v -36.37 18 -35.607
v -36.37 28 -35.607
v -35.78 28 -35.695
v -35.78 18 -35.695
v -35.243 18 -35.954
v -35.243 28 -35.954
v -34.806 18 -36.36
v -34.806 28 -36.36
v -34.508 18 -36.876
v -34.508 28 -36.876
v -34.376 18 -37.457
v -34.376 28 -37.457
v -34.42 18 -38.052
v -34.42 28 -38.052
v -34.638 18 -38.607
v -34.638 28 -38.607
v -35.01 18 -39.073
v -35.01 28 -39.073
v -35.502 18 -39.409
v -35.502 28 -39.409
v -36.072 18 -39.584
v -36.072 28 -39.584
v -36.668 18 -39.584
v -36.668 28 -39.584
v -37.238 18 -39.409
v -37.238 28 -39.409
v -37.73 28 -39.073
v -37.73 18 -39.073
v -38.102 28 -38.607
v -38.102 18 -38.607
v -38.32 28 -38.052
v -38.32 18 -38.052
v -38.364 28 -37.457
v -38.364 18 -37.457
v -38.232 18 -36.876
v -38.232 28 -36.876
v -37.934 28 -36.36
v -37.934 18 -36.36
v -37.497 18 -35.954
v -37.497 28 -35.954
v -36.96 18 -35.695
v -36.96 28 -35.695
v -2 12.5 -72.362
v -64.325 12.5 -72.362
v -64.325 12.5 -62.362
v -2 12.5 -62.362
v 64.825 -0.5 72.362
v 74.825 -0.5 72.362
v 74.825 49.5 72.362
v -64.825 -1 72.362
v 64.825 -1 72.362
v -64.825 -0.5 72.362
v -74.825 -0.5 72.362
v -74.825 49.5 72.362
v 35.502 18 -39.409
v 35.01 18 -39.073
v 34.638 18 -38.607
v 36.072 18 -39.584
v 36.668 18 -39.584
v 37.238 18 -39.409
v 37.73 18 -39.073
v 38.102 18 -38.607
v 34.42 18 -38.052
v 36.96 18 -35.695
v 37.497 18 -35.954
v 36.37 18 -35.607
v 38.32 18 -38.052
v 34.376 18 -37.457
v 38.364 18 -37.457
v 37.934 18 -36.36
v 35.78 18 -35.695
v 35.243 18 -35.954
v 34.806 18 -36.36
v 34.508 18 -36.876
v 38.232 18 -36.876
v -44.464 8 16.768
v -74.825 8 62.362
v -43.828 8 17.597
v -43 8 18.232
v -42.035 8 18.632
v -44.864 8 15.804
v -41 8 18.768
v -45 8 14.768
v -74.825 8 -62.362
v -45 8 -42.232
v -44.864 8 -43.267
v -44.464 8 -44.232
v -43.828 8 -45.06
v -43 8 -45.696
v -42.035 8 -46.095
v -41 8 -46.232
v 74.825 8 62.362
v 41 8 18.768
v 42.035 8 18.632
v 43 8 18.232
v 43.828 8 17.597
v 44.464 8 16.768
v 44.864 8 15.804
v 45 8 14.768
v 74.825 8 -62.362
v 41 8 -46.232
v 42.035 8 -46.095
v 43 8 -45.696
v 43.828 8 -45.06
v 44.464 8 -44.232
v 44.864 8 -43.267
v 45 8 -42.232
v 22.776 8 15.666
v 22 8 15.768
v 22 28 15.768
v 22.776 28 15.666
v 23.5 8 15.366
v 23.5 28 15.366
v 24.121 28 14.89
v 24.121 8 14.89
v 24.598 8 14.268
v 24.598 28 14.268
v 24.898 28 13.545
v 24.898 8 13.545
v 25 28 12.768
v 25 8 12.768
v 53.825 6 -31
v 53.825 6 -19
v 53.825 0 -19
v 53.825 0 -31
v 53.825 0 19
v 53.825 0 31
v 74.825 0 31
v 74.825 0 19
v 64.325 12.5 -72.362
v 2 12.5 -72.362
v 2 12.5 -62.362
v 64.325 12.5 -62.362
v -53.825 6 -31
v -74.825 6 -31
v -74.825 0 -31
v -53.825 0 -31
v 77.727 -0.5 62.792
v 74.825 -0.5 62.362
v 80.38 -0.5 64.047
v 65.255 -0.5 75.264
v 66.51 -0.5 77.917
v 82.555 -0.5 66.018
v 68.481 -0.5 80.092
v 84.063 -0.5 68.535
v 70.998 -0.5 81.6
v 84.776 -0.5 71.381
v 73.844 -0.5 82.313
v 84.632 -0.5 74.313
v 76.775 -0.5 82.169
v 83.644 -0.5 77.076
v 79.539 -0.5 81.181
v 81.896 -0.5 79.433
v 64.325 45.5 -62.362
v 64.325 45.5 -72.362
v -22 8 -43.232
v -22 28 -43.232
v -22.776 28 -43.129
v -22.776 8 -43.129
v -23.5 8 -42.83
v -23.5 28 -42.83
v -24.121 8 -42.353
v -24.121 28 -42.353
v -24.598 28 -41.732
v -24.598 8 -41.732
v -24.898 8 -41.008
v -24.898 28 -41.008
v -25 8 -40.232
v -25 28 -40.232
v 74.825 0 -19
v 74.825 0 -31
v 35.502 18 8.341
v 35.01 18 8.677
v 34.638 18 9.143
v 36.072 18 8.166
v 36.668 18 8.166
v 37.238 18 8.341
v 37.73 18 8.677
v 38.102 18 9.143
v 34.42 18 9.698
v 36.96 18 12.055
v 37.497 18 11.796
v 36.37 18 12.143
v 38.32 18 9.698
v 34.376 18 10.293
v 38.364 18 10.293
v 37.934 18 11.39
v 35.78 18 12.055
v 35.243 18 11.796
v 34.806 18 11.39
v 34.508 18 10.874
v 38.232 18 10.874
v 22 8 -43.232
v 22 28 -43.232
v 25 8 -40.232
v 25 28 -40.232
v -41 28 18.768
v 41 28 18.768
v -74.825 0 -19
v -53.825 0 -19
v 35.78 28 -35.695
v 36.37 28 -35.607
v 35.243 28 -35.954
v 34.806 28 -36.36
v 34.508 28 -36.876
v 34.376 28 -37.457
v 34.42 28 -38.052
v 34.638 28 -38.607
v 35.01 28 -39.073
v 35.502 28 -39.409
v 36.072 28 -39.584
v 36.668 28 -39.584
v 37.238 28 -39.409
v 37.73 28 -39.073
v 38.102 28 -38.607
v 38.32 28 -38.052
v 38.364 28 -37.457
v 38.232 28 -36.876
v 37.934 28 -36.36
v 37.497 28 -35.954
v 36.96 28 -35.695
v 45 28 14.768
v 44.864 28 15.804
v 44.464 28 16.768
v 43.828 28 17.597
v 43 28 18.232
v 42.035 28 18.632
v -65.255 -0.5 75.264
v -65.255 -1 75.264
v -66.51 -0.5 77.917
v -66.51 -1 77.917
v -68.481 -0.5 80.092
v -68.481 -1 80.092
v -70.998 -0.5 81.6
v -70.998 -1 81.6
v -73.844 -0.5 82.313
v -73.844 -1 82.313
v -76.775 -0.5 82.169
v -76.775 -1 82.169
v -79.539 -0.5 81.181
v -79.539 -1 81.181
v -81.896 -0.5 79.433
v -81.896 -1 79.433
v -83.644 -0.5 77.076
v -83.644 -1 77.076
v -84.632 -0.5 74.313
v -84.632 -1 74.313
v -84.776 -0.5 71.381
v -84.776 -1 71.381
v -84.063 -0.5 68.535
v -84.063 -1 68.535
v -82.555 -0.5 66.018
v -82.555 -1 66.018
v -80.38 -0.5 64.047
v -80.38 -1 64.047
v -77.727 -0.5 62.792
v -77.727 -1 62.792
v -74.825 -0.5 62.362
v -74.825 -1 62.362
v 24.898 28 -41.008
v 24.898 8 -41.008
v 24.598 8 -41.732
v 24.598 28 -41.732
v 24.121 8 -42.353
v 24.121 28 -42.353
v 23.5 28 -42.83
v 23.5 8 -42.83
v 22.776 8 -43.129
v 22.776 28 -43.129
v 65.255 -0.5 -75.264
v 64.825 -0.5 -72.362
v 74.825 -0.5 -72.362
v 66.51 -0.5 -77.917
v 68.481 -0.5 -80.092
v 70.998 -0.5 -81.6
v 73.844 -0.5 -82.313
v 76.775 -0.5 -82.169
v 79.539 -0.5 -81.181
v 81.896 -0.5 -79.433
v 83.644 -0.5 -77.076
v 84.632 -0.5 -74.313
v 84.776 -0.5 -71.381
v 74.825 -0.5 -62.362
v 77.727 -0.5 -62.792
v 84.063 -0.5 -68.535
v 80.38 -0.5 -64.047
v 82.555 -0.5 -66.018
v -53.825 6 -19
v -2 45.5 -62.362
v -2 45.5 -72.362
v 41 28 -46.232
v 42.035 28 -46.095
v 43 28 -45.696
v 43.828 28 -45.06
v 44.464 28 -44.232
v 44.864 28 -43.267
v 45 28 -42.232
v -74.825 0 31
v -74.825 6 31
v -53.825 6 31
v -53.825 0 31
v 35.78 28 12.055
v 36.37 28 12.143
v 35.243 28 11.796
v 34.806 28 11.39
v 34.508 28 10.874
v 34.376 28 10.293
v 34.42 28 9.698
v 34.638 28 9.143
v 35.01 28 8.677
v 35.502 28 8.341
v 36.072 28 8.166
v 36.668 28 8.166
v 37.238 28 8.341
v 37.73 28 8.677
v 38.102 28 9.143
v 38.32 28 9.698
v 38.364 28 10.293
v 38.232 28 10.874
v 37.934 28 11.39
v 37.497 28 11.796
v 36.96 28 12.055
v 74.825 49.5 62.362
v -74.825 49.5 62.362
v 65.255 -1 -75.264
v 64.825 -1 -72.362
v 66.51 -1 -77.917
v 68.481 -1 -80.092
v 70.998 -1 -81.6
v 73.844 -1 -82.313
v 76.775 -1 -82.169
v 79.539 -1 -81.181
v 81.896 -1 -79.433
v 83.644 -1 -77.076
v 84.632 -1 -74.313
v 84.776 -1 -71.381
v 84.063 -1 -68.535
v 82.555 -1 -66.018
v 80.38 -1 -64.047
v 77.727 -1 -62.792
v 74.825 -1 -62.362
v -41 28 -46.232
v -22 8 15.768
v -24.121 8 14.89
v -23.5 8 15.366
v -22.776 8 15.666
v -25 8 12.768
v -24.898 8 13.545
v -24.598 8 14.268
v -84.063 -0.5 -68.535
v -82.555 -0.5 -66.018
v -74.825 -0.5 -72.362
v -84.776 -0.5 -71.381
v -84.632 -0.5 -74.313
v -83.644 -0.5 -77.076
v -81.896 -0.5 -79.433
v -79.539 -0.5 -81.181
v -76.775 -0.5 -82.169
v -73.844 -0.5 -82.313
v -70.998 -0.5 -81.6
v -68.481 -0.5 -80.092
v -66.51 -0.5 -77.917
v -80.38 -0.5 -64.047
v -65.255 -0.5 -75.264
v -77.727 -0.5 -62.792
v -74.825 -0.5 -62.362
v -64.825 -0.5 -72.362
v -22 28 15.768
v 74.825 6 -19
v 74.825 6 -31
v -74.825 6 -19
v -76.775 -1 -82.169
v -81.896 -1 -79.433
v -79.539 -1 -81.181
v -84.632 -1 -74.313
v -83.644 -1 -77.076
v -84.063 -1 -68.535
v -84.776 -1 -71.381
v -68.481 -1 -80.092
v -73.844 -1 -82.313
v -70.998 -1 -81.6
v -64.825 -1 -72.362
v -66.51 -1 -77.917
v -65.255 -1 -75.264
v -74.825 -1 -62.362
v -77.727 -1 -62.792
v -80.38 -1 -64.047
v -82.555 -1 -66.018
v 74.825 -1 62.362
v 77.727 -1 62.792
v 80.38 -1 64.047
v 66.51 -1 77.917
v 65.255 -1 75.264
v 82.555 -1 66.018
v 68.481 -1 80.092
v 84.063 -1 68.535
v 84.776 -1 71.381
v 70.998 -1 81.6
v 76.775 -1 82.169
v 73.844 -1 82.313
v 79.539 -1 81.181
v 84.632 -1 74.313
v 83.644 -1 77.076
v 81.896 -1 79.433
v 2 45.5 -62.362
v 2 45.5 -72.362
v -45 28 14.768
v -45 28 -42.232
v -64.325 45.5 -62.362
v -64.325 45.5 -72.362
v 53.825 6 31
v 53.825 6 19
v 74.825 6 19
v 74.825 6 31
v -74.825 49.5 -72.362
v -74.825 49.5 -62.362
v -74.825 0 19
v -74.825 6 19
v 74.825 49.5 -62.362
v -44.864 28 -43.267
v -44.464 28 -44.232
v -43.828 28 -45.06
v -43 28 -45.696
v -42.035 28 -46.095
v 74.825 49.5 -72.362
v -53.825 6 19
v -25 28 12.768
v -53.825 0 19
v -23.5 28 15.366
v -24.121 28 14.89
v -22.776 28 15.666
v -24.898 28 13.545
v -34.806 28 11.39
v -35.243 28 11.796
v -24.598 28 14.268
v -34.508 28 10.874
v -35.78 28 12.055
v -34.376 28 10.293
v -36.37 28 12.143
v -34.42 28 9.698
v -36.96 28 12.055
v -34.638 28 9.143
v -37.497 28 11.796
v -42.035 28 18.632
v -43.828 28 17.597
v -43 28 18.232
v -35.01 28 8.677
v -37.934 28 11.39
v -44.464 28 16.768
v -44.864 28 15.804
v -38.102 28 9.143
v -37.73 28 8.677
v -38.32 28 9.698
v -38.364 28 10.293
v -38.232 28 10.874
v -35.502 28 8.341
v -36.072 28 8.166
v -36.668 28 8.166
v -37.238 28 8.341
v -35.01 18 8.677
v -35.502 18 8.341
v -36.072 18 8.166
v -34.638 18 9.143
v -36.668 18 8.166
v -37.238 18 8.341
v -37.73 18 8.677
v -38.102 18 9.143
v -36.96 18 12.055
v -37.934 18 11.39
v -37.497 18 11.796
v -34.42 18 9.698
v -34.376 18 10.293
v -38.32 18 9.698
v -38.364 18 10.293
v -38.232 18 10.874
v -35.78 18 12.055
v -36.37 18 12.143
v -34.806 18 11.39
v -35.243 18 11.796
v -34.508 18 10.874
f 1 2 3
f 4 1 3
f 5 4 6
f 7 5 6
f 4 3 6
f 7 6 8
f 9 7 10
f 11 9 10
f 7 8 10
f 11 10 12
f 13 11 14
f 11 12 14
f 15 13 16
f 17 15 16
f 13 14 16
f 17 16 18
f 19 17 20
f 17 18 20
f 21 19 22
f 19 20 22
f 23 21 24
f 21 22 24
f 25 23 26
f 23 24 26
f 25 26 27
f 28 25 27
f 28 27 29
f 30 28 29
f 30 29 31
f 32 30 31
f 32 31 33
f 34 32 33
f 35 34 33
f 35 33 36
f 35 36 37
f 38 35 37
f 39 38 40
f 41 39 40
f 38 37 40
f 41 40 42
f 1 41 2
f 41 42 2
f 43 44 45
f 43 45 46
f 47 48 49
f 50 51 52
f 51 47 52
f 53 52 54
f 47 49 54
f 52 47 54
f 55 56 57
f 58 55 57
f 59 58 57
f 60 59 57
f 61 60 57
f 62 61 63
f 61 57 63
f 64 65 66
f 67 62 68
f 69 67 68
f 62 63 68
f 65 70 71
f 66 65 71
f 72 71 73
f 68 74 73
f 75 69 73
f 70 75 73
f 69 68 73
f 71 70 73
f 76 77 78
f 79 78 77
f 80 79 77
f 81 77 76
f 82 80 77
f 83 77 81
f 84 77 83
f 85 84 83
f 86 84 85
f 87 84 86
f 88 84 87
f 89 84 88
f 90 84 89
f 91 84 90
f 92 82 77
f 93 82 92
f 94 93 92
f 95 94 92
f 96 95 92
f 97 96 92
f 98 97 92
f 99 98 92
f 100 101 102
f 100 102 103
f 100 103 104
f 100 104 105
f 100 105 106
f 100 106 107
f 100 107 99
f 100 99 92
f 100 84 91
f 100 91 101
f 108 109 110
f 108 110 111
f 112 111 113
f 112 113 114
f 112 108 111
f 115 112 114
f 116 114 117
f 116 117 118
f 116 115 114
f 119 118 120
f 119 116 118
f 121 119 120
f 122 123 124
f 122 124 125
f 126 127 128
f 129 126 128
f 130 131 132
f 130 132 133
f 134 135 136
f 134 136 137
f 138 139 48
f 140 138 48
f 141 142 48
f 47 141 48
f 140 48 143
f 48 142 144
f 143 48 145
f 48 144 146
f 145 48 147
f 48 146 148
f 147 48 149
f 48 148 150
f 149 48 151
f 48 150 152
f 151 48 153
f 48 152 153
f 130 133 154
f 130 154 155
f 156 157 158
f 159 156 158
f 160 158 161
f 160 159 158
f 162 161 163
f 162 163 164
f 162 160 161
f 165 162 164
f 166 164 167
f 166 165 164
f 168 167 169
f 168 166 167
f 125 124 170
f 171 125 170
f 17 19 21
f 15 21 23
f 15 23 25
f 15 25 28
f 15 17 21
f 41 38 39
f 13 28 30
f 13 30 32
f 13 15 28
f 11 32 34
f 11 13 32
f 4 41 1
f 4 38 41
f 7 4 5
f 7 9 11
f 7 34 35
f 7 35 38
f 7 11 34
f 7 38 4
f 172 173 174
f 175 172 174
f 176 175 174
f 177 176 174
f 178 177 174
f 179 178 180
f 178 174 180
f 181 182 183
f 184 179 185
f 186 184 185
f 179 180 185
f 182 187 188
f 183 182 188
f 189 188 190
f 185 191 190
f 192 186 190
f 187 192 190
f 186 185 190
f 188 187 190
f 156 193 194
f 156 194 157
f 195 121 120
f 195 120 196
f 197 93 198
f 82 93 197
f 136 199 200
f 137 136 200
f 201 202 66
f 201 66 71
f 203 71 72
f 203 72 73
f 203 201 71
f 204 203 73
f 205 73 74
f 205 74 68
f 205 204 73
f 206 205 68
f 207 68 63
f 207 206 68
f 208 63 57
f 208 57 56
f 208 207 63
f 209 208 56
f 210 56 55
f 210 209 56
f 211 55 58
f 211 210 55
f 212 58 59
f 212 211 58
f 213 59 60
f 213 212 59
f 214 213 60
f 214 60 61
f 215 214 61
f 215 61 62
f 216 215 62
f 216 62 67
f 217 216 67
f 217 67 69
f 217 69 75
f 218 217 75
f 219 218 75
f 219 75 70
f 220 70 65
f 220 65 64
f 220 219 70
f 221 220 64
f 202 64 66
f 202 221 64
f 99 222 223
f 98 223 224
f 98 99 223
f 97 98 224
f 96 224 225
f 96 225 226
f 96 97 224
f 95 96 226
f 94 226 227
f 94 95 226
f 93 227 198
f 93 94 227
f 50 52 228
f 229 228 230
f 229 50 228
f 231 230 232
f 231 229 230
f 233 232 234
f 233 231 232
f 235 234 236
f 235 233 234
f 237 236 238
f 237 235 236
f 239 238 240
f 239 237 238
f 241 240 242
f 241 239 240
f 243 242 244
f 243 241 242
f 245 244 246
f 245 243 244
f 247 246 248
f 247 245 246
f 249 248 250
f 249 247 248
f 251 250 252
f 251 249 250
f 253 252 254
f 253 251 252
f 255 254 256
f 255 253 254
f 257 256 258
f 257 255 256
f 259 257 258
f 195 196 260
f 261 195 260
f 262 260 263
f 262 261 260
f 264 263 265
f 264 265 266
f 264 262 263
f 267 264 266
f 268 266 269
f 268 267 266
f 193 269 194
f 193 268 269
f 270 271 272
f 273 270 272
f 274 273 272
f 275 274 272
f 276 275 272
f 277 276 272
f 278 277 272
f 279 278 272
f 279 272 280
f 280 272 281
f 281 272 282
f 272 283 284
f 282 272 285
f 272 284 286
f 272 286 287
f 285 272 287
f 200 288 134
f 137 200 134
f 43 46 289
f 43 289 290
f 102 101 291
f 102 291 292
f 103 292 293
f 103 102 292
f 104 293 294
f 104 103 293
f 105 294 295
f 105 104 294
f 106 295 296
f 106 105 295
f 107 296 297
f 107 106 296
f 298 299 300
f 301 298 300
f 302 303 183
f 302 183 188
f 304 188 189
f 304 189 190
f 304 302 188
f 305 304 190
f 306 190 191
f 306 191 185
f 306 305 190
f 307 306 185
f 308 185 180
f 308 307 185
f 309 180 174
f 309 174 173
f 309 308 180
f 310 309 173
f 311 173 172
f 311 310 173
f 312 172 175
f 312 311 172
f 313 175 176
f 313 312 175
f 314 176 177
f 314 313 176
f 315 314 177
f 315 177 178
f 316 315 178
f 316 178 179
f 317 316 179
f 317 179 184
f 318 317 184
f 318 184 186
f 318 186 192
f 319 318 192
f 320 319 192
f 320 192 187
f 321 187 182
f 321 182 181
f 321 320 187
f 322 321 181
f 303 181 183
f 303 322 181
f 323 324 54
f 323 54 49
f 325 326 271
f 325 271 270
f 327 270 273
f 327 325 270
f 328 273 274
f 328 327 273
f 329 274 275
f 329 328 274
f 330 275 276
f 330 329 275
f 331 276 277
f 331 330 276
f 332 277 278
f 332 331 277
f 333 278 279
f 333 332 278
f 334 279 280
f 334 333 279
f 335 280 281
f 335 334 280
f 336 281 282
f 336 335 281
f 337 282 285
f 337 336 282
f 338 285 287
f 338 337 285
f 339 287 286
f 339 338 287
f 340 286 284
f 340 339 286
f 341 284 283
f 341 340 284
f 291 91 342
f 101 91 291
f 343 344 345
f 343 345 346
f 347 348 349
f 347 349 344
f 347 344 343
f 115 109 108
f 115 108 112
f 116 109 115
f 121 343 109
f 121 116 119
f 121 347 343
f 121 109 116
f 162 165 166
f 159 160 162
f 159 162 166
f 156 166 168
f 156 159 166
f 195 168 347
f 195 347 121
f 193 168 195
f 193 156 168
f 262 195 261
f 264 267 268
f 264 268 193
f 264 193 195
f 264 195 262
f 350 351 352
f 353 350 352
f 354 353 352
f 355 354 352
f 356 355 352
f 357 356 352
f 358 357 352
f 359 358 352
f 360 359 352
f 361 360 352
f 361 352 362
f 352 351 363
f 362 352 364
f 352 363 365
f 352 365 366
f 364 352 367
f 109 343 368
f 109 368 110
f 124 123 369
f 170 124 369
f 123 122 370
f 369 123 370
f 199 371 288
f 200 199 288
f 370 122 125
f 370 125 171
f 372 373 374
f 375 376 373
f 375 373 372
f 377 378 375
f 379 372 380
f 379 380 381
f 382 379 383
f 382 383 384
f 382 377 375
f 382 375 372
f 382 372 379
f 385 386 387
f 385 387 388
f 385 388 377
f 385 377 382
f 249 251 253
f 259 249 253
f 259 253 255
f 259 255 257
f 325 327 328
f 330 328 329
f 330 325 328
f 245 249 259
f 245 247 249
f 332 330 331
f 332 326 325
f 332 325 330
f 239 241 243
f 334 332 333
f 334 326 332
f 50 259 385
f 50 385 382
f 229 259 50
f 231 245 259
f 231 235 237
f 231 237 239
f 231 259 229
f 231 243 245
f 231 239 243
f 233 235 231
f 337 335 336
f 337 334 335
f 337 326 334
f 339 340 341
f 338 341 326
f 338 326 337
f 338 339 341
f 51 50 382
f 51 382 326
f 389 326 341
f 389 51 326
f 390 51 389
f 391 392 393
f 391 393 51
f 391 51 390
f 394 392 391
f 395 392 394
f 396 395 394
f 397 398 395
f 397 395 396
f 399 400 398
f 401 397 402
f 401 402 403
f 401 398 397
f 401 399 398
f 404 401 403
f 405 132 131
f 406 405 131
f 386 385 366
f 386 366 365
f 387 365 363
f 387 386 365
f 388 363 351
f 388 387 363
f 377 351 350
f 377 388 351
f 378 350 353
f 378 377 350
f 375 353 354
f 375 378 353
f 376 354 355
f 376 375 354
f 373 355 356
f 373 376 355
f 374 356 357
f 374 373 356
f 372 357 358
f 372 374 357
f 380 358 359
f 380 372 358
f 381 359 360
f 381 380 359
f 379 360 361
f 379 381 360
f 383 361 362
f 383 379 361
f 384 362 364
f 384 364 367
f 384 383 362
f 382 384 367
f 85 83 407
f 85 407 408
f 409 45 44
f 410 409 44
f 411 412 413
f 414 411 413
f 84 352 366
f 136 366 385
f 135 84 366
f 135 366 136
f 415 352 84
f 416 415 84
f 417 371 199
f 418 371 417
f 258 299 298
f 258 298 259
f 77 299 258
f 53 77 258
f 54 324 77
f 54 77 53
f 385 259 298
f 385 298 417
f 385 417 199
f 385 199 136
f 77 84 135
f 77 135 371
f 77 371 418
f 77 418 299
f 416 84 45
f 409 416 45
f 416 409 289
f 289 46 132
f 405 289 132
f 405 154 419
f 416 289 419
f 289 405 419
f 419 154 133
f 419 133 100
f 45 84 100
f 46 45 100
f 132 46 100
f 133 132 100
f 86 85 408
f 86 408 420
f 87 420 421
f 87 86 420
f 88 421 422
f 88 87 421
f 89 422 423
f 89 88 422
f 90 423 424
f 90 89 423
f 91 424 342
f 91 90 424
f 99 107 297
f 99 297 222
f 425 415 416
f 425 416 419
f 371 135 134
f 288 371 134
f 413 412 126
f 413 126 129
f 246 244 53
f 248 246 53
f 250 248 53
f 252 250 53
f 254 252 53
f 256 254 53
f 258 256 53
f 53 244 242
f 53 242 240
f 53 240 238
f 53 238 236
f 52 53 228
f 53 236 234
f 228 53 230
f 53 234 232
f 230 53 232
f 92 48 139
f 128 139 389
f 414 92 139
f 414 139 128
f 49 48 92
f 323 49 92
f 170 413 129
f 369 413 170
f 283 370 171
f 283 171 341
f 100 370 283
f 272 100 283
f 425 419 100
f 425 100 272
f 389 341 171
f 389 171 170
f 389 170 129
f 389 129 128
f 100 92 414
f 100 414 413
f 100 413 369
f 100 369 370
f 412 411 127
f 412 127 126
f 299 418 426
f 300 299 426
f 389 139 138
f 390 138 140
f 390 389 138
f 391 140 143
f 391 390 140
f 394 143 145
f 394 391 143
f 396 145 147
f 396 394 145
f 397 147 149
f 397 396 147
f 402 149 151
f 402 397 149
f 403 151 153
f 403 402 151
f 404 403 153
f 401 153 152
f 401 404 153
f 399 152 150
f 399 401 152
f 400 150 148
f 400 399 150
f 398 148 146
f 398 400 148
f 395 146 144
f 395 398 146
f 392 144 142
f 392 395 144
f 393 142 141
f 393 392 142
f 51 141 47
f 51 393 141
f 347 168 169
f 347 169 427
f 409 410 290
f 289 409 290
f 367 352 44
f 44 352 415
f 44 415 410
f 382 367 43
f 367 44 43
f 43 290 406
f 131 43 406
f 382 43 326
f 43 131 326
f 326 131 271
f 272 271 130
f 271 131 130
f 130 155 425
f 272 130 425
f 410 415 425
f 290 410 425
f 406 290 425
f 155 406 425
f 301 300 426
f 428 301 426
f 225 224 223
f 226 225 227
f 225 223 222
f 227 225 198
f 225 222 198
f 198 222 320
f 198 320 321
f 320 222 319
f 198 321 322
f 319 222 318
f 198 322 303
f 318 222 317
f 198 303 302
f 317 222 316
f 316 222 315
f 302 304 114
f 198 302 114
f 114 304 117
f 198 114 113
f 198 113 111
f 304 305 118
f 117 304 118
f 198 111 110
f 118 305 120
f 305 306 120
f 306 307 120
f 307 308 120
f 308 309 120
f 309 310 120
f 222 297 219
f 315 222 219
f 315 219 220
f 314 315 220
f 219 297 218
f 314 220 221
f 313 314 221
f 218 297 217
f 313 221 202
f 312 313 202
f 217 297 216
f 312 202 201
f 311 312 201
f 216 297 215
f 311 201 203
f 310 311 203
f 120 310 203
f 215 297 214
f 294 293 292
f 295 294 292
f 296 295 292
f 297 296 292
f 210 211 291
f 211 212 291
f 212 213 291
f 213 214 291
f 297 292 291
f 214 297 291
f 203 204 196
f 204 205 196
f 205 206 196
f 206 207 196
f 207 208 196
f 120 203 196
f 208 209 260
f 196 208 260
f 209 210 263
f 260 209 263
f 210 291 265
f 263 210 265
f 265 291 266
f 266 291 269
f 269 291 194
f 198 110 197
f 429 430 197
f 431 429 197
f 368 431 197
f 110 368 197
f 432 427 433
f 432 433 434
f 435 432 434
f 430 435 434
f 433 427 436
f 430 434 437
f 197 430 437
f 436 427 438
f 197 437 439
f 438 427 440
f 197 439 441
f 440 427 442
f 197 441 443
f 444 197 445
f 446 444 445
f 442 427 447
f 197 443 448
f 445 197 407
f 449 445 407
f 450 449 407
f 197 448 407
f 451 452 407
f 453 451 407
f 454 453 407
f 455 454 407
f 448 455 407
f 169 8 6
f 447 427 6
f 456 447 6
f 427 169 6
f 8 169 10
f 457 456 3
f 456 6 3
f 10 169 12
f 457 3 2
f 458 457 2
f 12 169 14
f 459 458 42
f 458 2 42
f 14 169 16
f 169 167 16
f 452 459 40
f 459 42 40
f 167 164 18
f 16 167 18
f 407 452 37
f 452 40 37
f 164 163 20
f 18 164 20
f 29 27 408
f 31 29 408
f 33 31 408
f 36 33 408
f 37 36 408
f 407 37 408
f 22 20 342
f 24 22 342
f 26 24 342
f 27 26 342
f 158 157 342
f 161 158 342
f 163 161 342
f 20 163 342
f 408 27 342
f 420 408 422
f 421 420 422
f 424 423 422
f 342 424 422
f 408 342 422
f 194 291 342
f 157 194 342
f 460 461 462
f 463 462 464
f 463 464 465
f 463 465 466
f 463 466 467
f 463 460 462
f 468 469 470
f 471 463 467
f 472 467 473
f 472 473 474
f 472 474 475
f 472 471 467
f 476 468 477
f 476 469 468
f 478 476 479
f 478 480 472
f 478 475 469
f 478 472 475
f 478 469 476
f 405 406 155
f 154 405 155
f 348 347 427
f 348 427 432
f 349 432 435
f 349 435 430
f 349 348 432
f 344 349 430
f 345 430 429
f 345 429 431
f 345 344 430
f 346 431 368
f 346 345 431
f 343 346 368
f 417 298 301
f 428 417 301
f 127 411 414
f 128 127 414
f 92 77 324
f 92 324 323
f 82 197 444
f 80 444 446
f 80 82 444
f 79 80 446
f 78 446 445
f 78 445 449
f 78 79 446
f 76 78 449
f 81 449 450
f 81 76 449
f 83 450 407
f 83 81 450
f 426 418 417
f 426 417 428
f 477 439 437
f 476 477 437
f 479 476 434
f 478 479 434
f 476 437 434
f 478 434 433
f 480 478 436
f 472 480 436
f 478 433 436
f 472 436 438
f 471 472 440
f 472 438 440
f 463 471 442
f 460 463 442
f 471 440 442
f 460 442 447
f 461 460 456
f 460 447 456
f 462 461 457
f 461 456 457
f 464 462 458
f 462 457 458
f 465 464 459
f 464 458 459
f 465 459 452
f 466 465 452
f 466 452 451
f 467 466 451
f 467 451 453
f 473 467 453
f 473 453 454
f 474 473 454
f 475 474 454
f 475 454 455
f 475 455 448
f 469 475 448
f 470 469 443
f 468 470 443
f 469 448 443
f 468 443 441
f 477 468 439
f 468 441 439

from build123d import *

# Parameters (mm, degrees)
BOSS_EXTRUDE1_DEPTH     = 8
SKETCH2_W               = 10.5
SKETCH2_H               = 10
BOSS_EXTRUDE2_DEPTH     = 37.5
SKETCH4_W               = 128.649180674
SKETCH4_H               = 10
BOSS_EXTRUDE4_DEPTH     = 4.5
BOSS_EXTRUDE5_DEPTH     = 10
SKETCH6_W               = 149.649180674
SKETCH6_H               = 10
BOSS_EXTRUDE6_DEPTH     = 4
CUT_EXTRUDE1_REACH      = 249.54
SKETCH7_R               = 2.5
MIRROR2_COPY_1_REACH    = 249.54
MIRROR2_COPY_1_SKETCH_R = 2.5
CUT_EXTRUDE2_REACH      = 314.548
SKETCH8_R               = 2.5
BOSS_EXTRUDE8_DEPTH     = 63
CUT_EXTRUDE3_REACH      = 257.708
SKETCH10_R              = 2.5
MIRROR5_COPY_1_REACH    = 257.708
MIRROR5_COPY_1_SKETCH_R = 2.5
CUT_EXTRUDE4_REACH      = 321.057
SKETCH11_R              = 2.5
SKETCH12_W              = 6.577848346
SKETCH12_H              = 46
BOSS_EXTRUDE9_DEPTH     = 12
BOSS_EXTRUDE10_DEPTH    = 20
SKETCH14_R              = 2
CUT_EXTRUDE5_DEPTH      = 10
SKETCH15_W              = 149.649180674
SKETCH15_H              = 10
BOSS_EXTRUDE11_DEPTH    = 41.5
SKETCH17_R              = 2
CUT_EXTRUDE6_DEPTH      = 10
ENL_V_START             = -2
ESQUISSE1_W             = 12
ESQUISSE1_H             = 42
ESQUISSE1_W_2           = 42
ESQUISSE1_H_2           = 12
ENL_V_MAT_EXTRU_1_DEPTH = 6
BOSS_EXTRU_1_DEPTH      = 1
CONG_1_R                = 5
ENL_V_MAT_EXTRU_2_DEPTH = 10
ESQUISSE5_W             = 52
ESQUISSE5_H             = 55
ENL_V_MAT_EXTRU_3_DEPTH = 10
ESQUISSE6_W             = 52
ESQUISSE6_H             = 55
ENL_V_MAT_EXTRU_4_DEPTH = 10
ESQUISSE7_W             = 52
ESQUISSE7_H             = 55
ENL_V_MAT_EXTRU_5_DEPTH = 10
ESQUISSE8_W             = 52
ESQUISSE8_H             = 55
ENL_V_MAT_EXTRU_6_DEPTH = 10
ESQUISSE9_W             = 52
ESQUISSE9_H             = 55
ENL_V_MAT_EXTRU_7_DEPTH = 10
BOSS_EXTRU_2_REACH      = 182.079
ESQUISSE11_W            = 4
ESQUISSE11_H            = 10
ENL_V_MAT_EXTRU_8_DEPTH = 186.634594874
ESQUISSE13_R            = 10
BOSS_EXTRU_3_DEPTH      = 0.5


with BuildPart() as part:
    # Sketch1 → Boss-Extrude1 (new body)
    with BuildSketch(Plane(origin=(0, 0, 0), x_dir=(1, 0, 0), z_dir=(0, 1, 0))):
        Polygon((-150, 45), (-150, -45), (-74.824590337, -72.361611466), (74.824590337, -72.361611466), (150, -45), (150, 45), (74.824590337, 72.361611466), (-74.824590337, 72.361611466), align=None)
    extrude(amount=BOSS_EXTRUDE1_DEPTH)

    # Sketch2 → Boss-Extrude2 (add)
    with BuildSketch(Plane(origin=(0, 8, 0), x_dir=(1, 0, 0), z_dir=(0, 1, 0))):
        with Locations((69.574590337, 67.361611466)):
            Rectangle(SKETCH2_W, SKETCH2_H)
        with Locations((-69.574590337, 67.361611466)):
            Rectangle(SKETCH2_W, SKETCH2_H)
    extrude(amount=BOSS_EXTRUDE2_DEPTH)

    # Sketch4 → Boss-Extrude4 (add)
    with BuildSketch(Plane(origin=(0, 8, 0), x_dir=(1, 0, 0), z_dir=(0, 1, 0))):
        with Locations((0, 67.361611466)):
            Rectangle(SKETCH4_W, SKETCH4_H)
    extrude(amount=BOSS_EXTRUDE4_DEPTH)

    # Sketch5 → Boss-Extrude5 (add)
    with BuildSketch(Plane(origin=(0, 8, 0), x_dir=(1, 0, 0), z_dir=(0, 1, 0))):
        Polygon((-74.824590337, 62.361611466), (-87.040594407, 57.915349603), (-140.603073792, 38.420201433), (-143.422151654, 37.394141003), (-143.422151654, -37.394141003), (-140.603073792, -38.420201433), (-87.040594407, -57.915349603), (-74.824590337, -62.361611466), (-74.824590337, -72.361611466), (-150, -45), (-150, 45), (-74.824590337, 72.361611466), align=None)
        Polygon((150, 45), (150, -45), (74.824590337, -72.361611466), (74.824590337, -62.361611466), (87.040594407, -57.915349603), (140.603073792, -38.420201433), (143.422151654, -37.394141003), (143.422151654, 37.394141003), (140.603073792, 38.420201433), (87.040594407, 57.915349603), (74.824590337, 62.361611466), (74.824590337, 72.361611466), align=None)
    extrude(amount=BOSS_EXTRUDE5_DEPTH)

    # Sketch6 → Boss-Extrude6 (add)
    with BuildSketch(Plane(origin=(0, 45.5, 0), x_dir=(1, 0, 0), z_dir=(0, 1, 0))):
        with Locations((0, 67.361611466)):
            Rectangle(SKETCH6_W, SKETCH6_H)
    extrude(amount=BOSS_EXTRUDE6_DEPTH)

    # Sketch7 → Cut-Extrude1 (cut, up to next)
    with BuildSketch(Plane(origin=(32.009387984, 0, -87.945070697), x_dir=(-0.9396926207859068, 0, -0.3420201433256732), z_dir=(0.3420201433256732, 0, -0.9396926207859068)), mode=Mode.PRIVATE) as cut_extrude1_sk1:
        with Locations((-113.852986668, 13)):
            Circle(SKETCH7_R)
    cut_extrude1_tool1 = extrude(cut_extrude1_sk1.sketch, amount=-CUT_EXTRUDE1_REACH, mode=Mode.PRIVATE) & part.part
    # Sketch7 → Cut-Extrude1 (cut, up to next)
    with BuildSketch(Plane(origin=(32.009387984, 0, -87.945070697), x_dir=(-0.9396926207859068, 0, -0.3420201433256732), z_dir=(0.3420201433256732, 0, -0.9396926207859068)), mode=Mode.PRIVATE) as cut_extrude1_sk2:
        with Locations((-57.272986668, 13)):
            Circle(SKETCH7_R)
    cut_extrude1_tool2 = extrude(cut_extrude1_sk2.sketch, amount=-CUT_EXTRUDE1_REACH, mode=Mode.PRIVATE) & part.part
    cut_extrude1_1 = cut_extrude1_tool1.solids().sort_by_distance((138.996199, 13, -49.005056))[0]
    add(cut_extrude1_1, mode=Mode.SUBTRACT)
    cut_extrude1_2 = cut_extrude1_tool2.solids().sort_by_distance((85.828391, 13, -68.356556))[0]
    add(cut_extrude1_2, mode=Mode.SUBTRACT)
    cut_extrude1 = cut_extrude1_1 + cut_extrude1_2  # Cut-Extrude1 as one shape, for the pattern or mirror that repeats it

    # Mirror1: Cut-Extrude1 across plane
    add(cut_extrude1.mirror(Plane(origin=(0, 0, 0), x_dir=(0, 0, 1), z_dir=(1, 0, 0))), mode=Mode.SUBTRACT)

    # Mirror2: Cut-Extrude1 across plane
    add(cut_extrude1.mirror(Plane(origin=(0, 0, 0), x_dir=(1, 0, 0), z_dir=(0, 0, -1))), mode=Mode.SUBTRACT)

    # Mirror2 copy 1 sketch → Mirror2 copy 1 (cut, up to next)
    with BuildSketch(Plane(origin=(-32.009387984, 0, 87.945070697), x_dir=(0.9396926207859068, 0, 0.3420201433256732), z_dir=(-0.3420201433256732, 0, 0.9396926207859068)), mode=Mode.PRIVATE) as mirror2_copy_1_sk1:
        with Locations((-113.852986668, 13)):
            Circle(MIRROR2_COPY_1_SKETCH_R)
    mirror2_copy_1_tool1 = extrude(mirror2_copy_1_sk1.sketch, amount=-MIRROR2_COPY_1_REACH, mode=Mode.PRIVATE) & part.part
    # Mirror2 copy 1 sketch → Mirror2 copy 1 (cut, up to next)
    with BuildSketch(Plane(origin=(-32.009387984, 0, 87.945070697), x_dir=(0.9396926207859068, 0, 0.3420201433256732), z_dir=(-0.3420201433256732, 0, 0.9396926207859068)), mode=Mode.PRIVATE) as mirror2_copy_1_sk2:
        with Locations((-57.272986668, 13)):
            Circle(MIRROR2_COPY_1_SKETCH_R)
    mirror2_copy_1_tool2 = extrude(mirror2_copy_1_sk2.sketch, amount=-MIRROR2_COPY_1_REACH, mode=Mode.PRIVATE) & part.part
    add(mirror2_copy_1_tool1.solids().sort_by_distance((-138.996199, 13, 49.005056))[0], mode=Mode.SUBTRACT)
    add(mirror2_copy_1_tool2.solids().sort_by_distance((-85.828391, 13, 68.356556))[0], mode=Mode.SUBTRACT)

    # Sketch8 → Cut-Extrude2 (cut, up to next)
    with BuildSketch(Plane(origin=(150, 0, 0), x_dir=(0, 0, -1), z_dir=(1, 0, 0)), mode=Mode.PRIVATE) as cut_extrude2_sk1:
        with Locations((-28.29, 13)):
            Circle(SKETCH8_R)
    cut_extrude2_tool1 = extrude(cut_extrude2_sk1.sketch, amount=-CUT_EXTRUDE2_REACH, mode=Mode.PRIVATE) & part.part
    # Sketch8 → Cut-Extrude2 (cut, up to next)
    with BuildSketch(Plane(origin=(150, 0, 0), x_dir=(0, 0, -1), z_dir=(1, 0, 0)), mode=Mode.PRIVATE) as cut_extrude2_sk2:
        with Locations((28.29, 13)):
            Circle(SKETCH8_R)
    cut_extrude2_tool2 = extrude(cut_extrude2_sk2.sketch, amount=-CUT_EXTRUDE2_REACH, mode=Mode.PRIVATE) & part.part
    cut_extrude2_1 = cut_extrude2_tool1.solids().sort_by_distance((150, 13, 28.29))[0]
    add(cut_extrude2_1, mode=Mode.SUBTRACT)
    cut_extrude2_2 = cut_extrude2_tool2.solids().sort_by_distance((150, 13, -28.29))[0]
    add(cut_extrude2_2, mode=Mode.SUBTRACT)
    cut_extrude2 = cut_extrude2_1 + cut_extrude2_2  # Cut-Extrude2 as one shape, for the pattern or mirror that repeats it

    # Mirror3: Cut-Extrude2 across plane
    add(cut_extrude2.mirror(Plane(origin=(0, 0, 0), x_dir=(0, 0, 1), z_dir=(1, 0, 0))), mode=Mode.SUBTRACT)

    # Sketch9 → Boss-Extrude8 (add)
    with BuildSketch(Plane(origin=(0, 18, 0), x_dir=(1, 0, 0), z_dir=(0, 1, 0))):
        Polygon((143.422151654, 23), (150, 23), (150, 45), (134.025225447, 50.814342437), (130.811287398, 41.984120221), (143.422151654, 37.394141003), align=None)
        Polygon((74.824590337, 72.361611466), (90.79936489, 66.54726903), (87.585426842, 57.717046814), (74.824590337, 62.361611466), align=None)
        Polygon((-74.824590337, 62.361611466), (-74.824590337, 72.361611466), (-90.79936489, 66.54726903), (-87.585426842, 57.717046814), align=None)
        Polygon((-143.422151654, 37.394141003), (-143.422151654, 23), (-150, 23), (-150, 45), (-134.025225447, 50.814342437), (-130.811287398, 41.984120221), align=None)
        Polygon((143.422151654, -37.394141003), (143.422151654, -23), (150, -23), (150, -45), (134.025225447, -50.814342437), (130.811287398, -41.984120221), align=None)
        Polygon((-143.422151654, -23), (-150, -23), (-150, -45), (-134.025225447, -50.814342437), (-130.811287398, -41.984120221), (-143.422151654, -37.394141003), align=None)
        Polygon((-74.824590337, -72.361611466), (-90.79936489, -66.54726903), (-87.585426842, -57.717046814), (-74.824590337, -62.361611466), align=None)
        Polygon((74.824590337, -62.361611466), (74.824590337, -72.361611466), (90.79936489, -66.54726903), (87.585426842, -57.717046814), align=None)
    extrude(amount=BOSS_EXTRUDE8_DEPTH)

    # Sketch10 → Cut-Extrude3 (cut, up to next)
    with BuildSketch(Plane(origin=(32.009387984, 0, -87.945070697), x_dir=(-0.9396926207859068, 0, -0.3420201433256732), z_dir=(0.3420201433256732, 0, -0.9396926207859068)), mode=Mode.PRIVATE) as cut_extrude3_sk1:
        with Locations((-113.852986668, 74)):
            Circle(SKETCH10_R)
    cut_extrude3_tool1 = extrude(cut_extrude3_sk1.sketch, amount=-CUT_EXTRUDE3_REACH, mode=Mode.PRIVATE) & part.part
    # Sketch10 → Cut-Extrude3 (cut, up to next)
    with BuildSketch(Plane(origin=(32.009387984, 0, -87.945070697), x_dir=(-0.9396926207859068, 0, -0.3420201433256732), z_dir=(0.3420201433256732, 0, -0.9396926207859068)), mode=Mode.PRIVATE) as cut_extrude3_sk2:
        with Locations((-57.272986668, 74)):
            Circle(SKETCH10_R)
    cut_extrude3_tool2 = extrude(cut_extrude3_sk2.sketch, amount=-CUT_EXTRUDE3_REACH, mode=Mode.PRIVATE) & part.part
    cut_extrude3_1 = cut_extrude3_tool1.solids().sort_by_distance((138.996199, 74, -49.005056))[0]
    add(cut_extrude3_1, mode=Mode.SUBTRACT)
    cut_extrude3_2 = cut_extrude3_tool2.solids().sort_by_distance((85.828391, 74, -68.356556))[0]
    add(cut_extrude3_2, mode=Mode.SUBTRACT)
    cut_extrude3 = cut_extrude3_1 + cut_extrude3_2  # Cut-Extrude3 as one shape, for the pattern or mirror that repeats it

    # Mirror4: Cut-Extrude3 across plane
    add(cut_extrude3.mirror(Plane(origin=(0, 0, 0), x_dir=(0, 0, 1), z_dir=(1, 0, 0))), mode=Mode.SUBTRACT)

    # Mirror5: Cut-Extrude3 across plane
    add(cut_extrude3.mirror(Plane(origin=(0, 0, 0), x_dir=(1, 0, 0), z_dir=(0, 0, -1))), mode=Mode.SUBTRACT)

    # Mirror5 copy 1 sketch → Mirror5 copy 1 (cut, up to next)
    with BuildSketch(Plane(origin=(-32.009387984, 0, 87.945070697), x_dir=(0.9396926207859068, 0, 0.3420201433256732), z_dir=(-0.3420201433256732, 0, 0.9396926207859068)), mode=Mode.PRIVATE) as mirror5_copy_1_sk1:
        with Locations((-113.852986668, 74)):
            Circle(MIRROR5_COPY_1_SKETCH_R)
    mirror5_copy_1_tool1 = extrude(mirror5_copy_1_sk1.sketch, amount=-MIRROR5_COPY_1_REACH, mode=Mode.PRIVATE) & part.part
    # Mirror5 copy 1 sketch → Mirror5 copy 1 (cut, up to next)
    with BuildSketch(Plane(origin=(-32.009387984, 0, 87.945070697), x_dir=(0.9396926207859068, 0, 0.3420201433256732), z_dir=(-0.3420201433256732, 0, 0.9396926207859068)), mode=Mode.PRIVATE) as mirror5_copy_1_sk2:
        with Locations((-57.272986668, 74)):
            Circle(MIRROR5_COPY_1_SKETCH_R)
    mirror5_copy_1_tool2 = extrude(mirror5_copy_1_sk2.sketch, amount=-MIRROR5_COPY_1_REACH, mode=Mode.PRIVATE) & part.part
    add(mirror5_copy_1_tool1.solids().sort_by_distance((-138.996199, 74, 49.005056))[0], mode=Mode.SUBTRACT)
    add(mirror5_copy_1_tool2.solids().sort_by_distance((-85.828391, 74, 68.356556))[0], mode=Mode.SUBTRACT)

    # Sketch11 → Cut-Extrude4 (cut, up to next)
    with BuildSketch(Plane(origin=(150, 0, 0), x_dir=(0, 0, -1), z_dir=(1, 0, 0)), mode=Mode.PRIVATE) as cut_extrude4_sk1:
        with Locations((-28.29, 74)):
            Circle(SKETCH11_R)
    cut_extrude4_tool1 = extrude(cut_extrude4_sk1.sketch, amount=-CUT_EXTRUDE4_REACH, mode=Mode.PRIVATE) & part.part
    # Sketch11 → Cut-Extrude4 (cut, up to next)
    with BuildSketch(Plane(origin=(150, 0, 0), x_dir=(0, 0, -1), z_dir=(1, 0, 0)), mode=Mode.PRIVATE) as cut_extrude4_sk2:
        with Locations((28.29, 74)):
            Circle(SKETCH11_R)
    cut_extrude4_tool2 = extrude(cut_extrude4_sk2.sketch, amount=-CUT_EXTRUDE4_REACH, mode=Mode.PRIVATE) & part.part
    cut_extrude4_1 = cut_extrude4_tool1.solids().sort_by_distance((150, 74, 28.29))[0]
    add(cut_extrude4_1, mode=Mode.SUBTRACT)
    cut_extrude4_2 = cut_extrude4_tool2.solids().sort_by_distance((150, 74, -28.29))[0]
    add(cut_extrude4_2, mode=Mode.SUBTRACT)
    cut_extrude4 = cut_extrude4_1 + cut_extrude4_2  # Cut-Extrude4 as one shape, for the pattern or mirror that repeats it

    # Mirror6: Cut-Extrude4 across plane
    add(cut_extrude4.mirror(Plane(origin=(0, 0, 0), x_dir=(0, 0, 1), z_dir=(1, 0, 0))), mode=Mode.SUBTRACT)

    # Sketch12 → Boss-Extrude9 (add)
    with BuildSketch(Plane(origin=(0, 81, 0), x_dir=(1, 0, 0), z_dir=(0, 1, 0))):
        Polygon((130.811287398, 41.984120221), (87.585426842, 57.717046814), (90.79936489, 66.54726903), (134.025225447, 50.814342437), align=None)
        with Locations((146.711075827, 0)):
            Rectangle(SKETCH12_W, SKETCH12_H)
        Polygon((134.025225447, -50.814342437), (130.811287398, -41.984120221), (87.585426842, -57.717046814), (90.79936489, -66.54726903), align=None)
        Polygon((-130.811287398, -41.984120221), (-87.585426842, -57.717046814), (-90.79936489, -66.54726903), (-134.025225447, -50.814342437), align=None)
        with Locations((-146.711075827, 0)):
            Rectangle(SKETCH12_W, SKETCH12_H)
        Polygon((-134.025225447, 50.814342437), (-130.811287398, 41.984120221), (-87.585426842, 57.717046814), (-90.79936489, 66.54726903), align=None)
    extrude(amount=-BOSS_EXTRUDE9_DEPTH)

    # Sketch13 → Boss-Extrude10 (add)
    with BuildSketch(Plane(origin=(0, 8, 0), x_dir=(1, 0, 0), z_dir=(0, 1, 0))):
        with BuildLine():
            Line((-41, 46.231611466), (-29, 46.231611466))
            Line((-29, 46.231611466), (29, 46.231611466))
            Line((29, 46.231611466), (41, 46.231611466))
            ThreePointArc((41, 46.231611466), (43.828427125, 45.060038591), (45, 42.231611466))
            Line((45, 42.231611466), (45, -14.768388534))
            ThreePointArc((45, -14.768388534), (43.828427125, -17.596815659), (41, -18.768388534))
            Line((41, -18.768388534), (29, -18.768388534))
            Line((29, -18.768388534), (-29, -18.768388534))
            Line((-29, -18.768388534), (-41, -18.768388534))
            ThreePointArc((-41, -18.768388534), (-43.828427125, -17.596815659), (-45, -14.768388534))
            Line((-45, -14.768388534), (-45, 42.231611466))
            ThreePointArc((-45, 42.231611466), (-43.828427125, 45.060038591), (-41, 46.231611466))
        make_face()
        with BuildLine():
            Line((-25, 40.231611466), (-25, -12.768388534))
            ThreePointArc((-25, -12.768388534), (-24.121320344, -14.889708878), (-22, -15.768388534))
            Line((-22, -15.768388534), (22, -15.768388534))
            ThreePointArc((22, -15.768388534), (24.121320344, -14.889708878), (25, -12.768388534))
            Line((25, -12.768388534), (25, 40.231611466))
            ThreePointArc((25, 40.231611466), (24.121320344, 42.35293181), (22, 43.231611466))
            Line((22, 43.231611466), (-22, 43.231611466))
            ThreePointArc((-22, 43.231611466), (-24.121320344, 42.35293181), (-25, 40.231611466))
        make_face(mode=Mode.SUBTRACT)
    extrude(amount=BOSS_EXTRUDE10_DEPTH)

    # Sketch14 → Cut-Extrude5 (cut)
    with BuildSketch(Plane(origin=(0, 28, 0), x_dir=(1, 0, 0), z_dir=(0, 1, 0))):
        with Locations(Location((-36.37, 37.606611466, 0), (0, 0, 270))):
            Circle(SKETCH14_R)
        with Locations(Location((-36.37, -10.143388534, 0), (0, 0, 270))):
            Circle(SKETCH14_R)
    cut_extrude5 = extrude(amount=-CUT_EXTRUDE5_DEPTH, mode=Mode.SUBTRACT)

    # Mirror7: Cut-Extrude5 across plane
    add(cut_extrude5.mirror(Plane(origin=(0, 0, 0), x_dir=(0, 0, 1), z_dir=(1, 0, 0))), mode=Mode.SUBTRACT)

    # Sketch15 → Boss-Extrude11 (add)
    with BuildSketch(Plane(origin=(0, 8, 0), x_dir=(1, 0, 0), z_dir=(0, 1, 0))):
        with Locations((0, -67.361611466)):
            Rectangle(SKETCH15_W, SKETCH15_H)
    extrude(amount=BOSS_EXTRUDE11_DEPTH)

    # Sketch17 → Cut-Extrude6 (cut)
    with BuildSketch(Plane(origin=(0, 81, 0), x_dir=(1, 0, 0), z_dir=(0, 1, 0))):
        with Locations(Location((145.085087734, -41.558541382, 0), (0, 0, 270))):
            Circle(SKETCH17_R)
        with Locations(Location((145.085087734, 41.558541382, 0), (0, 0, 90))):
            Circle(SKETCH17_R)
        with Locations(Location((-145.085087734, 41.558541382, 0), (0, 0, 270))):
            Circle(SKETCH17_R)
        with Locations(Location((-145.085087734, -41.558541382, 0), (0, 0, 90))):
            Circle(SKETCH17_R)
    extrude(amount=-CUT_EXTRUDE6_DEPTH, mode=Mode.SUBTRACT)

    # Esquisse1 → Enlèv. mat.-Extru.1 (cut)
    with BuildSketch(Plane(origin=(0, 8, 0), x_dir=(1, 0, 0), z_dir=(0, 1, 0)).offset(ENL_V_START)):
        with Locations((-126, 0)):
            Rectangle(ESQUISSE1_W, ESQUISSE1_H)
        with Locations((126, 0)):
            Rectangle(ESQUISSE1_W, ESQUISSE1_H)
        with Locations((-74.824590337, 25)):
            Rectangle(ESQUISSE1_W_2, ESQUISSE1_H_2)
        with Locations((-74.824590337, -25)):
            Rectangle(ESQUISSE1_W_2, ESQUISSE1_H_2)
        with Locations((74.824590337, -25)):
            Rectangle(ESQUISSE1_W_2, ESQUISSE1_H_2)
        with Locations((74.824590337, 25)):
            Rectangle(ESQUISSE1_W_2, ESQUISSE1_H_2)
    extrude(amount=-ENL_V_MAT_EXTRU_1_DEPTH, mode=Mode.SUBTRACT)

    # Esquisse2 → Boss.-Extru.1 (add)
    with BuildSketch(Plane.XZ):
        Polygon((-150, -45), (-74.824590337, -72.361611466), (74.824590337, -72.361611466), (150, -45), (150, 45), (74.824590337, 72.361611466), (-74.824590337, 72.361611466), (-150, 45), align=None)
    extrude(amount=BOSS_EXTRU_1_DEPTH)

    # Congé1
    cong_1_edges = [part.edges().sort_by_distance(p)[0] for p in [
        (150, 40, -45),
        (150, 40, 45),
        (-150, 40, 45),
        (-150, 40, -45),
    ]]
    fillet(cong_1_edges, radius=CONG_1_R)

    # Esquisse3 → Enlèv. mat.-Extru.2 (cut)
    with BuildSketch(Plane(origin=(-32.009387984, 0, 87.945070697), x_dir=(0.9396926207859068, 0, 0.34202014332567315), z_dir=(-0.34202014332567315, 0, 0.9396926207859069))):
        with BuildLine():
            Line((-56.562986668, 69), (-62.562986668, 69))
            Line((-62.562986668, 69), (-62.562986668, 18))
            Line((-62.562986668, 18), (-108.562986668, 18))
            Line((-108.562986668, 18), (-108.562986668, 14))
            Line((-108.562986668, 14), (-59.564274516, 14))
            ThreePointArc((-59.564274516, 14), (-58.328004424, 15.266481312), (-56.562986668, 15.3970607))
            Line((-56.562986668, 15.3970607), (-56.562986668, 69))
        make_face()
    extrude(amount=-ENL_V_MAT_EXTRU_2_DEPTH, mode=Mode.SUBTRACT)

    # Esquisse5 → Enlèv. mat.-Extru.3 (cut)
    with BuildSketch(Plane.ZY.offset(150)):
        with Locations((3, 41.5)):
            Rectangle(ESQUISSE5_W, ESQUISSE5_H)
    extrude(amount=-ENL_V_MAT_EXTRU_3_DEPTH, mode=Mode.SUBTRACT)

    # Esquisse6 → Enlèv. mat.-Extru.4 (cut)
    with BuildSketch(Plane(origin=(-32.009387984, 0, -87.945070697), x_dir=(-0.9396926207859068, 0, 0.34202014332567315), z_dir=(-0.34202014332567315, 0, -0.9396926207859069))):
        with Locations((88.562986668, 41.5)):
            Rectangle(ESQUISSE6_W, ESQUISSE6_H)
    extrude(amount=-ENL_V_MAT_EXTRU_4_DEPTH, mode=Mode.SUBTRACT)

    # Esquisse7 → Enlèv. mat.-Extru.5 (cut)
    with BuildSketch(Plane(origin=(32.009387984, 0, -87.945070697), x_dir=(-0.9396926207859068, 0, -0.3420201433256732), z_dir=(0.3420201433256732, 0, -0.9396926207859068))):
        with Locations((-82.562986668, 41.5)):
            Rectangle(ESQUISSE7_W, ESQUISSE7_H)
    extrude(amount=-ENL_V_MAT_EXTRU_5_DEPTH, mode=Mode.SUBTRACT)

    # Esquisse8 → Enlèv. mat.-Extru.6 (cut)
    with BuildSketch(Plane(origin=(150, 0, 0), x_dir=(0, 0, -1), z_dir=(1, 0, 0))):
        with Locations((3, 41.5)):
            Rectangle(ESQUISSE8_W, ESQUISSE8_H)
    extrude(amount=-ENL_V_MAT_EXTRU_6_DEPTH, mode=Mode.SUBTRACT)

    # Esquisse9 → Enlèv. mat.-Extru.7 (cut)
    with BuildSketch(Plane(origin=(32.009387984, 0, 87.945070697), x_dir=(0.9396926207859068, 0, -0.3420201433256732), z_dir=(0.3420201433256732, 0, 0.9396926207859068))):
        with Locations((88.562986668, 41.5)):
            Rectangle(ESQUISSE9_W, ESQUISSE9_H)
    extrude(amount=-ENL_V_MAT_EXTRU_7_DEPTH, mode=Mode.SUBTRACT)

    # Esquisse11 → Boss.-Extru.2 (add, up to next)
    with BuildSketch(Plane(origin=(0, 12.5, 0), x_dir=(1, 0, 0), z_dir=(0, 1, 0)), mode=Mode.PRIVATE) as boss_extru_2_sk1:
        with Locations((0, 67.361611466)):
            Rectangle(ESQUISSE11_W, ESQUISSE11_H)
    boss_extru_2_tool1 = extrude(boss_extru_2_sk1.sketch, amount=BOSS_EXTRU_2_REACH, mode=Mode.PRIVATE) - part.part
    add(boss_extru_2_tool1.solids().sort_by_distance((0, 12.5, -67.361611))[0])

    # Esquisse12 → Enlèv. mat.-Extru.8 (cut, through all)
    with BuildSketch(Plane(origin=(0, 81, 0), x_dir=(1, 0, 0), z_dir=(0, 1, 0))):
        Polygon((74.824590337, -74.951231664), (74.824590337, 102.234539141), (-74.824590337, 102.234539141), (-74.824590337, -146.92644803), (-203.199413677, -126.057634384), (-188.022094661, 94.645879634), (-19.291679618, 194.685093665), (183.822221219, 119.309023034), (217.580951732, -44.120206721), (162.3923462, -136.492041207), (87.820241487, -136.492041207), align=None)
    extrude(amount=-ENL_V_MAT_EXTRU_8_DEPTH, mode=Mode.SUBTRACT)

    # Esquisse13 → Boss.-Extru.3 (add)
    with BuildSketch(Plane.XZ.offset(1)):
        with Locations((74.824590337, -72.361611466)):
            Circle(ESQUISSE13_R)
        with Locations((-74.824590337, -72.361611466)):
            Circle(ESQUISSE13_R)
        with Locations((-74.824590337, 72.361611466)):
            Circle(ESQUISSE13_R)
        with Locations((74.824590337, 72.361611466)):
            Circle(ESQUISSE13_R)
    extrude(amount=-BOSS_EXTRU_3_DEPTH)


solid = part.part
